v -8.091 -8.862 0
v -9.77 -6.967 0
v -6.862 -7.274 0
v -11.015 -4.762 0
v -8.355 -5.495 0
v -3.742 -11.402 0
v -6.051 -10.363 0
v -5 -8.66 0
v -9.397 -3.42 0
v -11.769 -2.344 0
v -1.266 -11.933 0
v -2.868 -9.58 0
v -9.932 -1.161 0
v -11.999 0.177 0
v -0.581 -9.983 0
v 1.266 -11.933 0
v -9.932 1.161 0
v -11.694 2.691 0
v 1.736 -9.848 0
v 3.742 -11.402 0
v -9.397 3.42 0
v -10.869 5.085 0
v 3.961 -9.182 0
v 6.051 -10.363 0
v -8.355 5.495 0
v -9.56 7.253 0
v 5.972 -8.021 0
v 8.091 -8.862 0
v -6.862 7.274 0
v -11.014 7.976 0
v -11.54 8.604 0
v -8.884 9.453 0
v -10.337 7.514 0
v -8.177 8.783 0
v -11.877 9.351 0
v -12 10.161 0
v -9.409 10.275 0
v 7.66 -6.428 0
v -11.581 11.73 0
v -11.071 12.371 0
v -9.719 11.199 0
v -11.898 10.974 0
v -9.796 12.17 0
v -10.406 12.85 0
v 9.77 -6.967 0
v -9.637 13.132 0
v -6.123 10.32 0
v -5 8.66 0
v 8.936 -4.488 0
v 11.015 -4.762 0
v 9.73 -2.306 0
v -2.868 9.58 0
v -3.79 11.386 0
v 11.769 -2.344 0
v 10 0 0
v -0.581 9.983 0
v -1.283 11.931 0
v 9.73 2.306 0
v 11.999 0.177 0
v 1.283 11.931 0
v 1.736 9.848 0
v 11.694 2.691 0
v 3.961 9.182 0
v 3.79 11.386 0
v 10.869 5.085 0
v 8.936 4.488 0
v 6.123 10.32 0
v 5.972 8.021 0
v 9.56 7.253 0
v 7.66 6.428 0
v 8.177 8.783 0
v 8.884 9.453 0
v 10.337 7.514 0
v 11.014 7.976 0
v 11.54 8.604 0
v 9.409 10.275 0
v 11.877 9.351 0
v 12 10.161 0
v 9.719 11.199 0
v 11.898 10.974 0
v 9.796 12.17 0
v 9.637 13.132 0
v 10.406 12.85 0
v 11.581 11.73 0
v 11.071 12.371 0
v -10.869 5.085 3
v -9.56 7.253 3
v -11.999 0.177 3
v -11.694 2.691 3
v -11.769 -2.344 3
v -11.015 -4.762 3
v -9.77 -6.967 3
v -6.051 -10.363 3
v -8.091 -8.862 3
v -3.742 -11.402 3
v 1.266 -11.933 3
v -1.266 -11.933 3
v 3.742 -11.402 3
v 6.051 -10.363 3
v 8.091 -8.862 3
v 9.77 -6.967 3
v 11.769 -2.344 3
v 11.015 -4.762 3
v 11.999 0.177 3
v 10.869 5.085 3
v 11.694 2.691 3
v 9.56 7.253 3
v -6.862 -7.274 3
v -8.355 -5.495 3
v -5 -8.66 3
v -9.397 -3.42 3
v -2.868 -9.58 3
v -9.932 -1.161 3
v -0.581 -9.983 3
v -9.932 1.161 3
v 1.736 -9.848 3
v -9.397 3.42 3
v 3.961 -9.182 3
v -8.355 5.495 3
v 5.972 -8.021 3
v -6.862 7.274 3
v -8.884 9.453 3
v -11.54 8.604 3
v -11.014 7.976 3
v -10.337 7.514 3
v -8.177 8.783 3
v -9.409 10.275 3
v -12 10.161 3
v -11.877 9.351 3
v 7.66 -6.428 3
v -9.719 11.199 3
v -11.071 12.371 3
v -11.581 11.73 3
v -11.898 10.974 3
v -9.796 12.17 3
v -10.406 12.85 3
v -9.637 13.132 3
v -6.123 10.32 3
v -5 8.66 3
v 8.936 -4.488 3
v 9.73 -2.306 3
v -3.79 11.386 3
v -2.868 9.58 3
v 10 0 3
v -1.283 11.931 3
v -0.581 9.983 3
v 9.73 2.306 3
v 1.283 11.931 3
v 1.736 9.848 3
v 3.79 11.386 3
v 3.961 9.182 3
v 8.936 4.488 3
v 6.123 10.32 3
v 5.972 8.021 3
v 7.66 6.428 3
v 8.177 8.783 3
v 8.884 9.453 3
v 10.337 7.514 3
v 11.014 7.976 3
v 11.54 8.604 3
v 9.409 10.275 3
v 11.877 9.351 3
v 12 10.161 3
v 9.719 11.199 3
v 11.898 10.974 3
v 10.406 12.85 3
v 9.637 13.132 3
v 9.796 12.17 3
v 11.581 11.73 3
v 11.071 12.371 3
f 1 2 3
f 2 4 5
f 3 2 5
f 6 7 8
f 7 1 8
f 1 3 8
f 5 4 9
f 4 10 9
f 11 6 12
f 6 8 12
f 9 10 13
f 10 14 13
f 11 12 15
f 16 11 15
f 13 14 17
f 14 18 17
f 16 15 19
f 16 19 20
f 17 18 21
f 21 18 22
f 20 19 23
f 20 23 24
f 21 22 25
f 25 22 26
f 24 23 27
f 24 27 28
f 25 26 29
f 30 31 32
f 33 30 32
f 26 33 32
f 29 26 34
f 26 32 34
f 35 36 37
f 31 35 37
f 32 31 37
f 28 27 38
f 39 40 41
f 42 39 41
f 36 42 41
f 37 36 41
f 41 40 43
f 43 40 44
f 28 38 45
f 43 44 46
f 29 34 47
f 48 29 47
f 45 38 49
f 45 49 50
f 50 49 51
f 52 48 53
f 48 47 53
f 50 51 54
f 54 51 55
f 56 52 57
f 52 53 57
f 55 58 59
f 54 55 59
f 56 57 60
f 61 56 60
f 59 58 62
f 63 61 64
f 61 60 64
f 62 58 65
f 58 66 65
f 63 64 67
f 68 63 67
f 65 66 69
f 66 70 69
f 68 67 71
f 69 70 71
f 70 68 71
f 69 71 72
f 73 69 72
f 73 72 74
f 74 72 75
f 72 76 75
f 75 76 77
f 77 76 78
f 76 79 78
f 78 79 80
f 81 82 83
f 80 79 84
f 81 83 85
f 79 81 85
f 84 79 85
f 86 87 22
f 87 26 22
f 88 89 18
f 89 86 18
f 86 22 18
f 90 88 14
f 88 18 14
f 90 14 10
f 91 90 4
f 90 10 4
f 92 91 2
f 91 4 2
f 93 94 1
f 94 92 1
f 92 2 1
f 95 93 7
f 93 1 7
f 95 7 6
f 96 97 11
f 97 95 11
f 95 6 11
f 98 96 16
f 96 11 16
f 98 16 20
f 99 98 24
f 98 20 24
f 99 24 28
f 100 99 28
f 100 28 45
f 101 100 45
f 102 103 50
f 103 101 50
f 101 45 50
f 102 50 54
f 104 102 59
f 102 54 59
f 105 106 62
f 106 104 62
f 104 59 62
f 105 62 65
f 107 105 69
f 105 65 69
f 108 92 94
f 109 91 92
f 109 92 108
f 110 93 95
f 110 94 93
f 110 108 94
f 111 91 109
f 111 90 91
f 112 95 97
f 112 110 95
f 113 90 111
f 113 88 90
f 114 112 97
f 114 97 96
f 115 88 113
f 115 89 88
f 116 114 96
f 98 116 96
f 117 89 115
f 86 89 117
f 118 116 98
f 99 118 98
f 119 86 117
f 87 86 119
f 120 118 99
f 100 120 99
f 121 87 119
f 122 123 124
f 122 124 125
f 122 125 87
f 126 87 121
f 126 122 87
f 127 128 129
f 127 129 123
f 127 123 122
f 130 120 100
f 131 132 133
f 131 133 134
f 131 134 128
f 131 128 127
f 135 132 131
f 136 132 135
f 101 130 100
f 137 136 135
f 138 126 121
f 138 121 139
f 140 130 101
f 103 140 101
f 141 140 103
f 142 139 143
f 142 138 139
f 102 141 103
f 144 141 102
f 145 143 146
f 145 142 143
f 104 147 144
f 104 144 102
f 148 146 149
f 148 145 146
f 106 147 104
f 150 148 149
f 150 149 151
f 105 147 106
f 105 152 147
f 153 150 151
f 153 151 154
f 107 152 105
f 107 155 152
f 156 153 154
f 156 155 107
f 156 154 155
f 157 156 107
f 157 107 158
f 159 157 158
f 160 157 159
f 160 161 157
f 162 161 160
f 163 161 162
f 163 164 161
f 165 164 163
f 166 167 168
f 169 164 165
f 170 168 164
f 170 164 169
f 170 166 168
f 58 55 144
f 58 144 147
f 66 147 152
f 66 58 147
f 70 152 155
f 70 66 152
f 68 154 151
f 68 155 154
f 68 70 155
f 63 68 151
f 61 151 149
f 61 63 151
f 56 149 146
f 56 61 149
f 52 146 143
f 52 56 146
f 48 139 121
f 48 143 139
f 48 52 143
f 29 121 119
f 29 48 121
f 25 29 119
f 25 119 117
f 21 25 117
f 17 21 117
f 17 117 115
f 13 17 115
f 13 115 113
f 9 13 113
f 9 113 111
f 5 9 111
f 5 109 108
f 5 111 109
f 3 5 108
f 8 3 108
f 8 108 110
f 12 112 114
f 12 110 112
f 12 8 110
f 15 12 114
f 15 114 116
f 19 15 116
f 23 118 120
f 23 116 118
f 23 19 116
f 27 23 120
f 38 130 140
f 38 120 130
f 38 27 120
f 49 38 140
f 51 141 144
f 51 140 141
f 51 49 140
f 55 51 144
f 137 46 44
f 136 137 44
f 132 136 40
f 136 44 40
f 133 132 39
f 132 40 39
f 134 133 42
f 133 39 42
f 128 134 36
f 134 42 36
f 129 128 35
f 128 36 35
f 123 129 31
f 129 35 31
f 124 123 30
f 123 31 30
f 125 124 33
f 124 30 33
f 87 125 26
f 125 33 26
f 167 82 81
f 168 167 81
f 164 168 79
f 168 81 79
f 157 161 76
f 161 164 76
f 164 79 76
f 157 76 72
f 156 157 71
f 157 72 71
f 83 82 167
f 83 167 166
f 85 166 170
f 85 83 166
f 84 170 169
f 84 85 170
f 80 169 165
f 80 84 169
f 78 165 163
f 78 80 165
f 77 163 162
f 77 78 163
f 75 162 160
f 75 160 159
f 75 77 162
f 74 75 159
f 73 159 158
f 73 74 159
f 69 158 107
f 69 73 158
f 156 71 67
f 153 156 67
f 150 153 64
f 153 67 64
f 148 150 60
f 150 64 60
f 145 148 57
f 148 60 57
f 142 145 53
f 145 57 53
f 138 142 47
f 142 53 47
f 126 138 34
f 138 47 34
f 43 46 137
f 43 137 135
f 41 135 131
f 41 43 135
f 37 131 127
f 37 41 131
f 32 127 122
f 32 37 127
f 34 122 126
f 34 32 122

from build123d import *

# Parameters (mm, degrees)
CYLINDER003_R     = 4
CYLINDER003_DEPTH = 10
CYLINDER002_R     = 3
CYLINDER002_DEPTH = 3
CYLINDER001_R     = 10
CYLINDER001_DEPTH = 10
CYLINDER_R        = 12
CYLINDER_DEPTH    = 3


with BuildPart() as cilindro003:
    # Cylinder003 → Cylinder003 (new body)
    with BuildSketch(Plane(origin=(3.2, 1.8, 0), x_dir=(1, 0, 0), z_dir=(0, 0, 1))):
        Circle(CYLINDER003_R)
    extrude(amount=CYLINDER003_DEPTH)


with BuildPart() as cut001:
    # Cylinder002 → Cylinder002 (new body)
    with BuildSketch(Plane.XY):
        Circle(CYLINDER002_R)
    extrude(amount=CYLINDER002_DEPTH)

    # Cut001: cut Cilindro003
    add(cilindro003.part, mode=Mode.SUBTRACT)


with BuildPart() as cut001_1:
    # Cut001 placement: moved
    add(cut001.part.moved(Location((-9, 10.2, 0))))


with BuildPart() as fusion:
    # Part__Mirroring: instance of Cut001
    add(cut001_1.part.mirror(Plane(origin=(0, 0, 0), x_dir=(0, -1, 0), z_dir=(1, 0, 0))))

    # Fusion: union Cut001
    add(cut001_1.part)


with BuildPart() as cilindro001:
    # Cylinder001 → Cylinder001 (new body)
    with BuildSketch(Plane.XY.offset(-4)):
        Circle(CYLINDER001_R)
    extrude(amount=CYLINDER001_DEPTH)


with BuildPart() as fusion001:
    # Cylinder → Cylinder (new body)
    with BuildSketch(Plane.XY):
        Circle(CYLINDER_R)
    extrude(amount=CYLINDER_DEPTH)

    # Cut: cut Cilindro001
    add(cilindro001.part, mode=Mode.SUBTRACT)

    # Fusion001: union Fusion
    add(fusion.part)


solid = fusion001.part
